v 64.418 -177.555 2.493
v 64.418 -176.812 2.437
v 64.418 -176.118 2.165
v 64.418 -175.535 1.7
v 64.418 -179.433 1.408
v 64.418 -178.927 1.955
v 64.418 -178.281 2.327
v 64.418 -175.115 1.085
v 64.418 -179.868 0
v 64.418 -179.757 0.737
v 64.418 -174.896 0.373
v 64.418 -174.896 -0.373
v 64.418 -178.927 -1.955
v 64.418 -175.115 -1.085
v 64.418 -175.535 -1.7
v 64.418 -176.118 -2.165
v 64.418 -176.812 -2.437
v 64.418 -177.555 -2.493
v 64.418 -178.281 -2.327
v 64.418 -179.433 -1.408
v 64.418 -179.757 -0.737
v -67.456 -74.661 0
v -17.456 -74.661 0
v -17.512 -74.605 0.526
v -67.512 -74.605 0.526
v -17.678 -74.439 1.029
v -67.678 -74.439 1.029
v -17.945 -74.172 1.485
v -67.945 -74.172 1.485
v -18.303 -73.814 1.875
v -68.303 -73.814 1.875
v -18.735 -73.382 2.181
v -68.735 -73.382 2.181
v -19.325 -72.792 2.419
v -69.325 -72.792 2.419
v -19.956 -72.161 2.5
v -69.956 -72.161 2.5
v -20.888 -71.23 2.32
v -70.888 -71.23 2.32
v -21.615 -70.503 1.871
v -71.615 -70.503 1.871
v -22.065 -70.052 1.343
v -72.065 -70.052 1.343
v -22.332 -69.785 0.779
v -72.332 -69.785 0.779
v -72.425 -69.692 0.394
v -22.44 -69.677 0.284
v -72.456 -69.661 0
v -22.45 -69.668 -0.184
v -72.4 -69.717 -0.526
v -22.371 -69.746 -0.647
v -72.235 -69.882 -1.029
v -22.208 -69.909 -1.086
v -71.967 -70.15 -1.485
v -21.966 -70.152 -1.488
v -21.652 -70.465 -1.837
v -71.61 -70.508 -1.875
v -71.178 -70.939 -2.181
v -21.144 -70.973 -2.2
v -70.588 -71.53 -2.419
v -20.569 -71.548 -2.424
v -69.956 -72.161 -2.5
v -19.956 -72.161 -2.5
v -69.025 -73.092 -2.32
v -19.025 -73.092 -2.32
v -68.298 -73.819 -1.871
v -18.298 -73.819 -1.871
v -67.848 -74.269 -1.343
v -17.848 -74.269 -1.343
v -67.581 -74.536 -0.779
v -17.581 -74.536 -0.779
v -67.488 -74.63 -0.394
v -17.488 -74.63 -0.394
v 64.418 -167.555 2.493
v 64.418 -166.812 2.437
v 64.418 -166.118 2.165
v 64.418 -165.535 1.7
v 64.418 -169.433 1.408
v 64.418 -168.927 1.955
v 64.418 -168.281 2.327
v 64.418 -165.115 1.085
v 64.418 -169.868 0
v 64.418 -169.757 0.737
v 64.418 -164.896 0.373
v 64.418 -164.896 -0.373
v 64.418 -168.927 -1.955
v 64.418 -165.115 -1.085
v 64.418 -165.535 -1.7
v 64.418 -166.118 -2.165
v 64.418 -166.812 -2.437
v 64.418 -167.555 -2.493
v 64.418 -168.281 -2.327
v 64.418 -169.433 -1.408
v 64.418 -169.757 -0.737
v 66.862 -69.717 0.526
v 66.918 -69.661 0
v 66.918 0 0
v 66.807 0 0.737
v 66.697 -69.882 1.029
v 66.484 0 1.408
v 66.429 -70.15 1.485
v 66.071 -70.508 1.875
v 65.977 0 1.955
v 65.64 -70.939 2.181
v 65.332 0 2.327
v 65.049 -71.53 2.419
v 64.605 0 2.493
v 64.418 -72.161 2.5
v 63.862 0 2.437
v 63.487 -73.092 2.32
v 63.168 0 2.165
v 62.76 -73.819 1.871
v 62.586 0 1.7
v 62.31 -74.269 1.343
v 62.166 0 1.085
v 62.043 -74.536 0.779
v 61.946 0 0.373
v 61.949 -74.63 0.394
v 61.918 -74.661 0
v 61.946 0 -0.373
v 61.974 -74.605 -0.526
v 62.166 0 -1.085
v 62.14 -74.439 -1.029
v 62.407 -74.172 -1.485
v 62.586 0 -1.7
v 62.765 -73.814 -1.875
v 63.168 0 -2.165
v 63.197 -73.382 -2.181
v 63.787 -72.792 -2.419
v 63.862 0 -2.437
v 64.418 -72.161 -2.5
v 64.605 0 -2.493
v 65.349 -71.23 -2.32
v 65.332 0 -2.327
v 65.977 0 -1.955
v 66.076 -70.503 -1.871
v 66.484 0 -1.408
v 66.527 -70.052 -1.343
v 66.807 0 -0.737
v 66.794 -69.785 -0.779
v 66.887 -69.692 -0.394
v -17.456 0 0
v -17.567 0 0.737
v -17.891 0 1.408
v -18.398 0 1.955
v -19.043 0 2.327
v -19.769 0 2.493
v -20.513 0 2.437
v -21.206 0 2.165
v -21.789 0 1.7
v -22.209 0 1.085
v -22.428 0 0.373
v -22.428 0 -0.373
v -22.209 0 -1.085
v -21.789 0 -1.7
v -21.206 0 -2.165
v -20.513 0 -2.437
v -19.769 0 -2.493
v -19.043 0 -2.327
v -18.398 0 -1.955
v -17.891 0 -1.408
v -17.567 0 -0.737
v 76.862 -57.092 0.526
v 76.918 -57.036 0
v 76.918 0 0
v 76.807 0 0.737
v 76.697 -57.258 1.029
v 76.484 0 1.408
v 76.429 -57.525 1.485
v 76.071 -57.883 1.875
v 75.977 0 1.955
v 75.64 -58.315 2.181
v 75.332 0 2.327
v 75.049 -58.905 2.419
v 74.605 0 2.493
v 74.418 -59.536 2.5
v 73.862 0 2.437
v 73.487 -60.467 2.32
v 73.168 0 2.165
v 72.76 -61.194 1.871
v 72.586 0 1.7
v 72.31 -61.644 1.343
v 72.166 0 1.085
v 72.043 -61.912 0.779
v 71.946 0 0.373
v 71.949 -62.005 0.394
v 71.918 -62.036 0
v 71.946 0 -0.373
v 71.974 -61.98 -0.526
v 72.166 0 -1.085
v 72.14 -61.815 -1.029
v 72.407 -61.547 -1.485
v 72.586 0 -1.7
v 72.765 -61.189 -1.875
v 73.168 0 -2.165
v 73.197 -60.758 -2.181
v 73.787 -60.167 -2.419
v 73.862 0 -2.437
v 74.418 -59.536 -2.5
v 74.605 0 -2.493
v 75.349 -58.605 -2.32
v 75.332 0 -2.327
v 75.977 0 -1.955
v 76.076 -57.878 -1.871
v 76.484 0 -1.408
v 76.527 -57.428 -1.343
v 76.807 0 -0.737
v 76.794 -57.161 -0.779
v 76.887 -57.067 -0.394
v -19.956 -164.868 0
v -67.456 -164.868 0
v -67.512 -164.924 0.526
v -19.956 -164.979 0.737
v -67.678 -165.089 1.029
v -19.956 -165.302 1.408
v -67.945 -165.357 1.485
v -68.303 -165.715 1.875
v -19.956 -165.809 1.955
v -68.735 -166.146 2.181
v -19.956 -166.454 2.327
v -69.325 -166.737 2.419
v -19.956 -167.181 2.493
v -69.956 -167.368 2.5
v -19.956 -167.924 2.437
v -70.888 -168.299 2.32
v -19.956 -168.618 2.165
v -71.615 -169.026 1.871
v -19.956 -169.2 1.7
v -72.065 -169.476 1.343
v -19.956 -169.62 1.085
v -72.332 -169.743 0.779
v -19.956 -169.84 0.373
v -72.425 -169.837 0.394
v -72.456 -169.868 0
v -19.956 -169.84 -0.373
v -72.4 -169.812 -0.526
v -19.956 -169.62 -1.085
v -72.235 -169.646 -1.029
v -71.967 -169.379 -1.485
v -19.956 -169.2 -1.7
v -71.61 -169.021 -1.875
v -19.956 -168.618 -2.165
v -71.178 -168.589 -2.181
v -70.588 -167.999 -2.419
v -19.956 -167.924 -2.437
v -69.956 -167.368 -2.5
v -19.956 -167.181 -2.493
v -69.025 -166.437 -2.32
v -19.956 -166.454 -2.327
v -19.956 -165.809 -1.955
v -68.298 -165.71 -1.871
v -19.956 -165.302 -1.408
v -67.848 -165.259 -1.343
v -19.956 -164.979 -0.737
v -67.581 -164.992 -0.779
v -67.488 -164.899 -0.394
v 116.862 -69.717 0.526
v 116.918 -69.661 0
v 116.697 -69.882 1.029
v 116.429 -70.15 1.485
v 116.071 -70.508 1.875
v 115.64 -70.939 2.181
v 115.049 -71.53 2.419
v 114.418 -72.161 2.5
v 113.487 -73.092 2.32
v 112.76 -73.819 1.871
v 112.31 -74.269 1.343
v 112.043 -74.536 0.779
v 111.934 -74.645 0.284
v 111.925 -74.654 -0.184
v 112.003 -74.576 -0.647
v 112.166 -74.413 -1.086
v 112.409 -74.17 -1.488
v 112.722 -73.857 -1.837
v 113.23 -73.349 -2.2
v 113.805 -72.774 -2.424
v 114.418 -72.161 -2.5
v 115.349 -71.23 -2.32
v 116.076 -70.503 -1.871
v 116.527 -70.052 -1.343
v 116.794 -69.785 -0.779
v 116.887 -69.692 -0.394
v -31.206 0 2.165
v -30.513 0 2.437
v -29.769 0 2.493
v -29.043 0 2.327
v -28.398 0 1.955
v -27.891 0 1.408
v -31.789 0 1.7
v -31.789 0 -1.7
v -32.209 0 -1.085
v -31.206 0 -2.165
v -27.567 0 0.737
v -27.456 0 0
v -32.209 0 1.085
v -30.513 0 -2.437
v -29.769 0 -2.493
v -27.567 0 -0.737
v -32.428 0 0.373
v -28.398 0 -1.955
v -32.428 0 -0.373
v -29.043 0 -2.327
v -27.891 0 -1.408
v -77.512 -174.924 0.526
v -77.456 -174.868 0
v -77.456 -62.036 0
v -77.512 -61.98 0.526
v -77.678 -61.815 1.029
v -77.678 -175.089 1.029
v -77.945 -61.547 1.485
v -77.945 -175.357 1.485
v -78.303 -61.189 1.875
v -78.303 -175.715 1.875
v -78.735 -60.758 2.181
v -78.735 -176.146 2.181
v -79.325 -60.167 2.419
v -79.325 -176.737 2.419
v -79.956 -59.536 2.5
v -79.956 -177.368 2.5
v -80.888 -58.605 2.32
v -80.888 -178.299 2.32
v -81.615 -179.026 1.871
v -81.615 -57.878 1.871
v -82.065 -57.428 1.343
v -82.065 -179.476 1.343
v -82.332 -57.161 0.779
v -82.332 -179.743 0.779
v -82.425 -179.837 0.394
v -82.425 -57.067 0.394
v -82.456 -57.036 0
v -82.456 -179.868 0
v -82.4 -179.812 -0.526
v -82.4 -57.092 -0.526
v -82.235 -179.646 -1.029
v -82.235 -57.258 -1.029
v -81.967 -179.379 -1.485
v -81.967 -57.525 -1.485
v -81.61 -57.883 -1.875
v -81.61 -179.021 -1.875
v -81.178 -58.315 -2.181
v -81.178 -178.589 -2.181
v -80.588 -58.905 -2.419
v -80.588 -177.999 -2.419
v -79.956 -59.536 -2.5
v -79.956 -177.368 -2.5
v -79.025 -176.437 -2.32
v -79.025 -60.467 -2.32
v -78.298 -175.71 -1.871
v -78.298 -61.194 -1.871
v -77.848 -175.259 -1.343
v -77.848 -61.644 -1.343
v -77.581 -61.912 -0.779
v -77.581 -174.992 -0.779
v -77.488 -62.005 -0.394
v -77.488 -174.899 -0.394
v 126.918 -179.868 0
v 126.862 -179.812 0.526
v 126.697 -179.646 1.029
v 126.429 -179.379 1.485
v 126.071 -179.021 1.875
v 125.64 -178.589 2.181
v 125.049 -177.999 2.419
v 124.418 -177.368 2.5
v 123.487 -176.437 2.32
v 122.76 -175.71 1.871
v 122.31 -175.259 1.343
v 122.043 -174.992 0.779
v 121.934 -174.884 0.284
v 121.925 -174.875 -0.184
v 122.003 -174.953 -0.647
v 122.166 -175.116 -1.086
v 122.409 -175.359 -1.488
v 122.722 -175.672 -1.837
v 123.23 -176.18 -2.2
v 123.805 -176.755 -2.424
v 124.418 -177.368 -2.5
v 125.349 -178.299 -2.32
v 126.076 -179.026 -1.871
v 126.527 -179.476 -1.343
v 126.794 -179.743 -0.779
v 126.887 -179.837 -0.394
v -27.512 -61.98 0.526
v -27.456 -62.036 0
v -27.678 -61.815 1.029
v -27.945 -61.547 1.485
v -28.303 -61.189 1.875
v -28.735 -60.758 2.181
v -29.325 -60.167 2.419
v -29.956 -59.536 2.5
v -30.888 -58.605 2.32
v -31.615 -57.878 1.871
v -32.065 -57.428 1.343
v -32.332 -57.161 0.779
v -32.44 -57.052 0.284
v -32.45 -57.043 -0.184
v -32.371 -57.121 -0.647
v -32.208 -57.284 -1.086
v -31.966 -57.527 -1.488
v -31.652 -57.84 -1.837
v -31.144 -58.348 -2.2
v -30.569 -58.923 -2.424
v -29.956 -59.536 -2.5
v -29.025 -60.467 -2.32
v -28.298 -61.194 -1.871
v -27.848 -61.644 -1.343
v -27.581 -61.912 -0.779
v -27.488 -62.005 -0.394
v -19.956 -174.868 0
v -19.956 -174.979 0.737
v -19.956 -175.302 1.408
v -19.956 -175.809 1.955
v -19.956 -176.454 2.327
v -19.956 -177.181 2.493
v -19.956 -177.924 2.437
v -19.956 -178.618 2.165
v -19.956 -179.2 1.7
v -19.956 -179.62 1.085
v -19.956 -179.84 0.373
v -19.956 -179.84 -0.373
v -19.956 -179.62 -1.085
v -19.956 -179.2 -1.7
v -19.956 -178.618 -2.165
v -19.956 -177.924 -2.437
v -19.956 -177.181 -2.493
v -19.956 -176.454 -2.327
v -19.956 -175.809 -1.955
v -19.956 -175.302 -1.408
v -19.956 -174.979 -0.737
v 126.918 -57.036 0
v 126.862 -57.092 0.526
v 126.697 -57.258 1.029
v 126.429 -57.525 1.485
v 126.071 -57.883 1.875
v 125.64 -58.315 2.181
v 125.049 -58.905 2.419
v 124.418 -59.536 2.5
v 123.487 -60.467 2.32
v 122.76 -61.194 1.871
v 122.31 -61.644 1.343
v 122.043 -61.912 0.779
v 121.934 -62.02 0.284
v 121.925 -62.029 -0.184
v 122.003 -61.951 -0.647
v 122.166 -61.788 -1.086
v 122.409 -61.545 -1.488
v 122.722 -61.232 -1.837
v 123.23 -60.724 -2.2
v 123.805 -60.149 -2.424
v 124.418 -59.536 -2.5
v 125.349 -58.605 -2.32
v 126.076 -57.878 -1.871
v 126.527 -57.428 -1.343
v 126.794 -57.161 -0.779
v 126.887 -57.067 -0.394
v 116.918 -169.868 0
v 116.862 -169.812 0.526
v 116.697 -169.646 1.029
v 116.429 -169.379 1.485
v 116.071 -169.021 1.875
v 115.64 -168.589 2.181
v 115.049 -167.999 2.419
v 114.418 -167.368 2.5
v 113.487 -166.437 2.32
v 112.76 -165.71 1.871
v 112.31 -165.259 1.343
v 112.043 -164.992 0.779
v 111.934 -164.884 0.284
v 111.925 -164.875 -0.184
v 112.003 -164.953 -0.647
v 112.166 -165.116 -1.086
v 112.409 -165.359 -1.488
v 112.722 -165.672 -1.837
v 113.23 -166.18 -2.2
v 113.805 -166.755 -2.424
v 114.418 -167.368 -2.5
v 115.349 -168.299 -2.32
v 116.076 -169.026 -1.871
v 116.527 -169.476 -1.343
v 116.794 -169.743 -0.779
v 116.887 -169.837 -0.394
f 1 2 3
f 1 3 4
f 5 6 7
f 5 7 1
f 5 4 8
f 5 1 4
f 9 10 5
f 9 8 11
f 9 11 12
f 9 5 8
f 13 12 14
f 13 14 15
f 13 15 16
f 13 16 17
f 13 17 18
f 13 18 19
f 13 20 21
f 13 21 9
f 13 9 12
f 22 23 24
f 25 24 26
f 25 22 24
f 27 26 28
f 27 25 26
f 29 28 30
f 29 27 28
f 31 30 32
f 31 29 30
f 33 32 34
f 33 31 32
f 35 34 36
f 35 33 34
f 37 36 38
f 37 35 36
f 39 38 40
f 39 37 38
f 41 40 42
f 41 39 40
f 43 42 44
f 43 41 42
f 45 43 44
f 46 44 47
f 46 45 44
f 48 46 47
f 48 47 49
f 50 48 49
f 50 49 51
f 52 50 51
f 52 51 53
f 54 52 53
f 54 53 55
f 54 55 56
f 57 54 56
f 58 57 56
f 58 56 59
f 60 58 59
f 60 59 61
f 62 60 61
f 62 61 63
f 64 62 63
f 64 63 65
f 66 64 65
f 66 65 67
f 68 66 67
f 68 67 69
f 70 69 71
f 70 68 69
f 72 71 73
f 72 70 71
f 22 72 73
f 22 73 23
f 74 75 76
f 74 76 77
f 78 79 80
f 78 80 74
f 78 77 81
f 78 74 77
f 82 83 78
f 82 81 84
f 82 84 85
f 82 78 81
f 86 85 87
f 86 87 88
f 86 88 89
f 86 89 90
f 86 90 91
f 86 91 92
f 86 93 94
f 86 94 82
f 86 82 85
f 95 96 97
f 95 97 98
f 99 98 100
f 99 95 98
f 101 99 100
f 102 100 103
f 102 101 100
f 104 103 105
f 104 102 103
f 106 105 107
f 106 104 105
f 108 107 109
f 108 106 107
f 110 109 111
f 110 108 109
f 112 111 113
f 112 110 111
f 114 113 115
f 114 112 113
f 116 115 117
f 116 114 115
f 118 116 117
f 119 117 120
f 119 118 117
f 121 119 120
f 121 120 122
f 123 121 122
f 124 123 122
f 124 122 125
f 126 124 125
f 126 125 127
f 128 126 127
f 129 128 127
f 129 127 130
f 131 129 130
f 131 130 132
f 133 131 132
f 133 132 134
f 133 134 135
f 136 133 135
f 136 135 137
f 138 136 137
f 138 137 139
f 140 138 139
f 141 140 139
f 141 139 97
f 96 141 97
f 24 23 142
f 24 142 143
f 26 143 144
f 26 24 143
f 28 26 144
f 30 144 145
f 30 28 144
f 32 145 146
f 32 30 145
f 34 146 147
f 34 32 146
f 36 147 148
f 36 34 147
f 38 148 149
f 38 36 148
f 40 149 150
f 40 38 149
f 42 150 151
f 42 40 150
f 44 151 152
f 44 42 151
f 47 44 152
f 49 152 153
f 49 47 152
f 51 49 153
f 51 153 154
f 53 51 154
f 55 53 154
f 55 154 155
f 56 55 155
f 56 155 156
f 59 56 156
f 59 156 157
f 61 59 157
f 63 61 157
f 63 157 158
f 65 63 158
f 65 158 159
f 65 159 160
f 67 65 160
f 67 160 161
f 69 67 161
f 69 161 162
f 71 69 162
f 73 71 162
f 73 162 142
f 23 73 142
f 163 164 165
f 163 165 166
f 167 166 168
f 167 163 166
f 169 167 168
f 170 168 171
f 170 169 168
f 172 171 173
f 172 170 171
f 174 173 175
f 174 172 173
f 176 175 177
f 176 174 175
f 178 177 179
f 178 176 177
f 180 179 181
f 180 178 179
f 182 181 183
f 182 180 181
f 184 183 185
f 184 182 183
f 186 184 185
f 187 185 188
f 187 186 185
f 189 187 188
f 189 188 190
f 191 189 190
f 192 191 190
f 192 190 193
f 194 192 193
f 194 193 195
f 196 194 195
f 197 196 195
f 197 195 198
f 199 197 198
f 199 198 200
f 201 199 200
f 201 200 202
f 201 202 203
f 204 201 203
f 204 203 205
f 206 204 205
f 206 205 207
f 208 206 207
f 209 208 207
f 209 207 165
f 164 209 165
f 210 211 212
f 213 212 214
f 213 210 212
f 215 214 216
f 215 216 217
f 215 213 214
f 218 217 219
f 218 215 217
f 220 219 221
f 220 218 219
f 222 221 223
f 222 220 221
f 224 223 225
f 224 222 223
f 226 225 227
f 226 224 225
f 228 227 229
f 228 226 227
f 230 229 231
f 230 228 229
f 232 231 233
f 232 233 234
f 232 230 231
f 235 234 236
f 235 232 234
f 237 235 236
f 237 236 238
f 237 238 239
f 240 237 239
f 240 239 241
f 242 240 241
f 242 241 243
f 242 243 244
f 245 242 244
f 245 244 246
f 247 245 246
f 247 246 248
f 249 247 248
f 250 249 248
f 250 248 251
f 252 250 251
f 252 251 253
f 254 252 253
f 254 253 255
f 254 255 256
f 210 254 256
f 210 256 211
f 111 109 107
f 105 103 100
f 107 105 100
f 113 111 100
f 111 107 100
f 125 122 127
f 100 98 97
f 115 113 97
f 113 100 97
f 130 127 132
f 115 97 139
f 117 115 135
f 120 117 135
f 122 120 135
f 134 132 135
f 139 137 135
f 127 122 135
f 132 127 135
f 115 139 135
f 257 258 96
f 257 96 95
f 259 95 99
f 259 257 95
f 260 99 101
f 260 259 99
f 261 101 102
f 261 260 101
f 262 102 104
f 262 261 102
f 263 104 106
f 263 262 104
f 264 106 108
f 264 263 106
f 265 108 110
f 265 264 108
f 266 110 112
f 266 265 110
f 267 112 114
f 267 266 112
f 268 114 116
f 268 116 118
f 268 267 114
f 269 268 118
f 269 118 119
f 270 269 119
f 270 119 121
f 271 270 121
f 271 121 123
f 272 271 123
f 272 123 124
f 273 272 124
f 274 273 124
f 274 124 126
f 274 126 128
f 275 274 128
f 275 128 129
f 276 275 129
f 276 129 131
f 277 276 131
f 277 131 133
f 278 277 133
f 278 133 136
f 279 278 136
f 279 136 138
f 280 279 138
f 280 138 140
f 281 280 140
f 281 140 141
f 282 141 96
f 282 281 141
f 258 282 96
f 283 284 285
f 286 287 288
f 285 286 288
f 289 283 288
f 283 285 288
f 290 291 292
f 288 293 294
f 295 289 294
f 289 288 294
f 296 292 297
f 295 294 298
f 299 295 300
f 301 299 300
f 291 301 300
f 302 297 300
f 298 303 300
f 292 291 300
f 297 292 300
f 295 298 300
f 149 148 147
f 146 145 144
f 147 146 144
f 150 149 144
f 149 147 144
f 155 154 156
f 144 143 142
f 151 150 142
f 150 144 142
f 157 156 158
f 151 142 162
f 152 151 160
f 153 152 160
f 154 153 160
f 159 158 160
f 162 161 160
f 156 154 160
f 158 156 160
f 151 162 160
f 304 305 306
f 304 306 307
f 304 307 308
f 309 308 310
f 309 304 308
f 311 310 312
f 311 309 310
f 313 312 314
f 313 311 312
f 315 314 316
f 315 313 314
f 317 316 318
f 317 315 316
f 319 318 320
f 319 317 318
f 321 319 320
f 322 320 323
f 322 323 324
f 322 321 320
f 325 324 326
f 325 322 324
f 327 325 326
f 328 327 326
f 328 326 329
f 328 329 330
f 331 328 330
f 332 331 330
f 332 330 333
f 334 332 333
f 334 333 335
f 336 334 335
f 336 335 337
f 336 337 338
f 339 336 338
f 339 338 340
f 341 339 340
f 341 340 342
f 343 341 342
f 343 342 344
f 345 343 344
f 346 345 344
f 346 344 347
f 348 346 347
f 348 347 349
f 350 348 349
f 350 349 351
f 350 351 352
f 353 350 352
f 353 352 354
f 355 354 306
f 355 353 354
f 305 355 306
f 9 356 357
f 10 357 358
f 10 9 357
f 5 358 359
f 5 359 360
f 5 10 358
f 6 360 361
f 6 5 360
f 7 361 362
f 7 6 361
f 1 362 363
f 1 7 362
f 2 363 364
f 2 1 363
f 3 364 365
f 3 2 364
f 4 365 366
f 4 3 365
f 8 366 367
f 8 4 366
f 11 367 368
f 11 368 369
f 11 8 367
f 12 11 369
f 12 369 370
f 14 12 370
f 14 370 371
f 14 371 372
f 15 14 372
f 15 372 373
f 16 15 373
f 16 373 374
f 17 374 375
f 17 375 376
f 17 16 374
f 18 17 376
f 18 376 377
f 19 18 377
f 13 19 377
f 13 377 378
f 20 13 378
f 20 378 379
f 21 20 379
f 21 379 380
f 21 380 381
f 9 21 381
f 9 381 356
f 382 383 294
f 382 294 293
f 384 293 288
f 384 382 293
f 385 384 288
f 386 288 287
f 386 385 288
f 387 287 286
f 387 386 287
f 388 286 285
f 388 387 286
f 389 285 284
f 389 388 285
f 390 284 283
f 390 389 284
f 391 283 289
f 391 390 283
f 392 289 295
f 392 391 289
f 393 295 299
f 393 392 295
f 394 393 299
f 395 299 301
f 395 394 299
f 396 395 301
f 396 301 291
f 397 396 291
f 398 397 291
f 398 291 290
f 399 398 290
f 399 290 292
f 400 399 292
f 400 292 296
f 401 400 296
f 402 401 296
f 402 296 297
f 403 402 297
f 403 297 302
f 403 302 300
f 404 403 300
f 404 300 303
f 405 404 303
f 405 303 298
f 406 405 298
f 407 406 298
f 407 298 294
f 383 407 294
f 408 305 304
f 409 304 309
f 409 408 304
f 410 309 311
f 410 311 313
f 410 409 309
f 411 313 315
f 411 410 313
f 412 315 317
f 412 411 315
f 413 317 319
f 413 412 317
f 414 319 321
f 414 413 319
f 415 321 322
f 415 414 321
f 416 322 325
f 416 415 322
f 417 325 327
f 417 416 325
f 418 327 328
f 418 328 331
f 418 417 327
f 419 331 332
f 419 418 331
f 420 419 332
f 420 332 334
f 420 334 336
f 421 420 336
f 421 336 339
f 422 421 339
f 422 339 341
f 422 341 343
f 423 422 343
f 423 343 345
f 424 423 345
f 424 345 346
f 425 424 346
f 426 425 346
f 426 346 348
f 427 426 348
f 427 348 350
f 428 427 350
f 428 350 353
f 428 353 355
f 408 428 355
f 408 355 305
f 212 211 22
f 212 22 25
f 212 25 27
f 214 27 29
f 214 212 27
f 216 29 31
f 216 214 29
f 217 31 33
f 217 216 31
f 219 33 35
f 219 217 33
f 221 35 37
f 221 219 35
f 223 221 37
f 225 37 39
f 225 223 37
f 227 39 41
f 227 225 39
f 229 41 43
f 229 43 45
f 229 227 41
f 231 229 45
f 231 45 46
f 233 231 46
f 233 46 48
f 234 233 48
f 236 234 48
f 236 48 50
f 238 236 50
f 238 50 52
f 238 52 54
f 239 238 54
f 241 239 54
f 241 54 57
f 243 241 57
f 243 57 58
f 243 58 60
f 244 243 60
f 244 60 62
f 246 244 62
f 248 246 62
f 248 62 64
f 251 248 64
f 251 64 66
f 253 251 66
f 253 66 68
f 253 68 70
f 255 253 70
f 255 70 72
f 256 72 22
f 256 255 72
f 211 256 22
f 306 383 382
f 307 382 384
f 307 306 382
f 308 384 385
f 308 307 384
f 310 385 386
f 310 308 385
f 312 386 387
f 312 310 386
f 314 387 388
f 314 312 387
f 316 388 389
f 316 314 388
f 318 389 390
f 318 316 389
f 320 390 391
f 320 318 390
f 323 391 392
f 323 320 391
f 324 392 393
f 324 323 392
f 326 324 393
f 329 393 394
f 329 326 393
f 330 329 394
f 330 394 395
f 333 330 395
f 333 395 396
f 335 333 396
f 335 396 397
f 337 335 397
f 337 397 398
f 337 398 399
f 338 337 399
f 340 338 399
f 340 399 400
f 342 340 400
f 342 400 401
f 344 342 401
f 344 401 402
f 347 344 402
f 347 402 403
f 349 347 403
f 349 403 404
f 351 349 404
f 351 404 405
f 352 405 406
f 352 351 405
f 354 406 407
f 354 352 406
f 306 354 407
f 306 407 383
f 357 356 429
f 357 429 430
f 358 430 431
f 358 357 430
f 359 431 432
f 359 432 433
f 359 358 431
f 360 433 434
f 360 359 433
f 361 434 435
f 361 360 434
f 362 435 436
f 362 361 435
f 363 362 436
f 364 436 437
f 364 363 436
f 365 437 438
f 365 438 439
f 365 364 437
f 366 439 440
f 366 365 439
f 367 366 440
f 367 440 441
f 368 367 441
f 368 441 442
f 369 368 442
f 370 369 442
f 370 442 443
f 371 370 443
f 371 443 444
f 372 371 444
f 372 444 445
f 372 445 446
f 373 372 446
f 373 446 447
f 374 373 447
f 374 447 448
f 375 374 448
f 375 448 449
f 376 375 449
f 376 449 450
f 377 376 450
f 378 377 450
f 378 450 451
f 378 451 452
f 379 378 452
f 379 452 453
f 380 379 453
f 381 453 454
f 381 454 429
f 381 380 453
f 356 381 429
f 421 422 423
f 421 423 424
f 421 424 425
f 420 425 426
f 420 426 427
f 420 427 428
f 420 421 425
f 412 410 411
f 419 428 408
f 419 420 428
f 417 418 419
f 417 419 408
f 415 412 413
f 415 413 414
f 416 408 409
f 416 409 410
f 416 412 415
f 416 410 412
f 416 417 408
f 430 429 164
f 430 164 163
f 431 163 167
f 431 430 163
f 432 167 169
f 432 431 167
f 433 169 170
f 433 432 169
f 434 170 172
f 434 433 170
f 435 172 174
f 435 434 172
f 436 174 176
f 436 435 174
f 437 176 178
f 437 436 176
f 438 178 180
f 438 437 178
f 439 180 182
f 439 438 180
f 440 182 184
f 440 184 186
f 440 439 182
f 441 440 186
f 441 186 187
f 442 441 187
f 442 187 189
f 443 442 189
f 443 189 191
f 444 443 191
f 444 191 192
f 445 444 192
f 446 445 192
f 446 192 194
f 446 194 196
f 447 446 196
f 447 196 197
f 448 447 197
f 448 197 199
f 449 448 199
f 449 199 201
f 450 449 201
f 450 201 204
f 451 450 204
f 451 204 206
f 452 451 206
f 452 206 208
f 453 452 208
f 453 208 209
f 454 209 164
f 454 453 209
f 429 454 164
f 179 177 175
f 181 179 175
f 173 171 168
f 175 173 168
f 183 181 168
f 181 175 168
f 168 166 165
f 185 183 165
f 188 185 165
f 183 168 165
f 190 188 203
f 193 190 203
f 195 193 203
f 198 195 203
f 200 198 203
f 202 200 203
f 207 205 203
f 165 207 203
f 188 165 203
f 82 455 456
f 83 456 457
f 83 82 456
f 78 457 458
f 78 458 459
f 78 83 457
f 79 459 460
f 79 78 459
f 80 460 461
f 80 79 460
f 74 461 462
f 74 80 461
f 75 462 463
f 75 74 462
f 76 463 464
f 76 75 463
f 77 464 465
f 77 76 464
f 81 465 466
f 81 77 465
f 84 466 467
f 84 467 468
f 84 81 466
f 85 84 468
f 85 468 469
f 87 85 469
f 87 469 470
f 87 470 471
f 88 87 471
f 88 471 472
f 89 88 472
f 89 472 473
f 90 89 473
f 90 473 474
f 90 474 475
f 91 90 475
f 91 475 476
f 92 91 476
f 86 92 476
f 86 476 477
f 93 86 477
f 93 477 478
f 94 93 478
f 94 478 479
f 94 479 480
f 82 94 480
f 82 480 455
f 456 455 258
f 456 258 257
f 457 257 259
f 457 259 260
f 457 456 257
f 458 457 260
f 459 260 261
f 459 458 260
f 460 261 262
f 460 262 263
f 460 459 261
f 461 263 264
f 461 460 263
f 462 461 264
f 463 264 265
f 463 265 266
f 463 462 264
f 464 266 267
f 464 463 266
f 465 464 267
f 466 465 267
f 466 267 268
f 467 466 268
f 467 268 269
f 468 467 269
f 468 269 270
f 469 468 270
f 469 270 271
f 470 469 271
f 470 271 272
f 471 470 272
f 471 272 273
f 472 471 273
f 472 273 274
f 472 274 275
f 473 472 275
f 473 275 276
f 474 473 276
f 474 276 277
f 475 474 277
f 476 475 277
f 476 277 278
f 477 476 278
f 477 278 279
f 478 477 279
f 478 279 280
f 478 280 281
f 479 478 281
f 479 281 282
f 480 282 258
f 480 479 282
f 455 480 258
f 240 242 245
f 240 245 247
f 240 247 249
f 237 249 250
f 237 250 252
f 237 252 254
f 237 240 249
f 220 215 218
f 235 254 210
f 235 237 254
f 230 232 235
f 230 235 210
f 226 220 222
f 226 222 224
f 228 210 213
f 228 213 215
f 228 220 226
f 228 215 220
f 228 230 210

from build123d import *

# Parameters (mm, degrees)
F1_R = 2.5


with BuildPart() as f2:
    # F2: sweep along a path in F0
    with BuildLine(Plane.XY) as f2_path:
        Line((-29.9563152033, 0), (-29.9563152033, -59.5360959382))
        Line((-29.9563152033, -59.5360959382), (-79.9563152033, -59.5360959382))
        Line((-79.9563152033, -59.5360959382), (-79.9563152033, -177.3678190376))
        Line((-79.9563152033, -177.3678190376), (-19.9563152033, -177.3678190376))
    # F1 (on Front) → F2 (sweep)
    with BuildSketch(Plane.XZ):
        with Locations((-29.9563152033, 0)):
            Circle(F1_R)
    sweep(path=f2_path.line, transition=Transition.RIGHT)


with BuildPart() as f3:
    # F3: sweep along a path in F0
    with BuildLine(Plane.XY) as f3_path:
        Line((-19.9563152033, 0), (-19.9563152033, -72.1608251333))
        Line((-19.9563152033, -72.1608251333), (-69.9563152033, -72.1608251333))
        Line((-69.9563152033, -72.1608251333), (-69.9563152033, -167.3678190376))
        Line((-69.9563152033, -167.3678190376), (-19.9563152033, -167.3678190376))
    # F1 (on Front) → F3 (sweep)
    with BuildSketch(Plane.XZ):
        with Locations((-19.9563152033, 0)):
            Circle(F1_R)
    sweep(path=f3_path.line, transition=Transition.RIGHT)


with BuildPart() as f4:
    # F4: sweep along a path in F0
    with BuildLine(Plane.XY) as f4_path:
        Line((64.418164144, 0), (64.418164144, -72.1608251333))
        Line((64.418164144, -72.1608251333), (114.418164144, -72.1608251333))
        Line((114.418164144, -72.1608251333), (114.418164144, -167.3678190376))
        Line((114.418164144, -167.3678190376), (64.418164144, -167.3678190376))
    # F1 (on Front) → F4 (sweep)
    with BuildSketch(Plane.XZ):
        with Locations((64.418164144, 0)):
            Circle(F1_R)
    sweep(path=f4_path.line, transition=Transition.RIGHT)


with BuildPart() as f5:
    # F5: sweep along a path in F0
    with BuildLine(Plane.XY) as f5_path:
        Line((74.418164144, 0), (74.418164144, -59.5360959382))
        Line((74.418164144, -59.5360959382), (124.418164144, -59.5360959382))
        Line((124.418164144, -59.5360959382), (124.418164144, -177.3678190376))
        Line((124.418164144, -177.3678190376), (64.418164144, -177.3678190376))
    # F1 (on Front) → F5 (sweep)
    with BuildSketch(Plane.XZ):
        with Locations((74.418164144, 0)):
            Circle(F1_R)
    sweep(path=f5_path.line, transition=Transition.RIGHT)


solid = Compound([f2.part, f3.part, f4.part, f5.part])
